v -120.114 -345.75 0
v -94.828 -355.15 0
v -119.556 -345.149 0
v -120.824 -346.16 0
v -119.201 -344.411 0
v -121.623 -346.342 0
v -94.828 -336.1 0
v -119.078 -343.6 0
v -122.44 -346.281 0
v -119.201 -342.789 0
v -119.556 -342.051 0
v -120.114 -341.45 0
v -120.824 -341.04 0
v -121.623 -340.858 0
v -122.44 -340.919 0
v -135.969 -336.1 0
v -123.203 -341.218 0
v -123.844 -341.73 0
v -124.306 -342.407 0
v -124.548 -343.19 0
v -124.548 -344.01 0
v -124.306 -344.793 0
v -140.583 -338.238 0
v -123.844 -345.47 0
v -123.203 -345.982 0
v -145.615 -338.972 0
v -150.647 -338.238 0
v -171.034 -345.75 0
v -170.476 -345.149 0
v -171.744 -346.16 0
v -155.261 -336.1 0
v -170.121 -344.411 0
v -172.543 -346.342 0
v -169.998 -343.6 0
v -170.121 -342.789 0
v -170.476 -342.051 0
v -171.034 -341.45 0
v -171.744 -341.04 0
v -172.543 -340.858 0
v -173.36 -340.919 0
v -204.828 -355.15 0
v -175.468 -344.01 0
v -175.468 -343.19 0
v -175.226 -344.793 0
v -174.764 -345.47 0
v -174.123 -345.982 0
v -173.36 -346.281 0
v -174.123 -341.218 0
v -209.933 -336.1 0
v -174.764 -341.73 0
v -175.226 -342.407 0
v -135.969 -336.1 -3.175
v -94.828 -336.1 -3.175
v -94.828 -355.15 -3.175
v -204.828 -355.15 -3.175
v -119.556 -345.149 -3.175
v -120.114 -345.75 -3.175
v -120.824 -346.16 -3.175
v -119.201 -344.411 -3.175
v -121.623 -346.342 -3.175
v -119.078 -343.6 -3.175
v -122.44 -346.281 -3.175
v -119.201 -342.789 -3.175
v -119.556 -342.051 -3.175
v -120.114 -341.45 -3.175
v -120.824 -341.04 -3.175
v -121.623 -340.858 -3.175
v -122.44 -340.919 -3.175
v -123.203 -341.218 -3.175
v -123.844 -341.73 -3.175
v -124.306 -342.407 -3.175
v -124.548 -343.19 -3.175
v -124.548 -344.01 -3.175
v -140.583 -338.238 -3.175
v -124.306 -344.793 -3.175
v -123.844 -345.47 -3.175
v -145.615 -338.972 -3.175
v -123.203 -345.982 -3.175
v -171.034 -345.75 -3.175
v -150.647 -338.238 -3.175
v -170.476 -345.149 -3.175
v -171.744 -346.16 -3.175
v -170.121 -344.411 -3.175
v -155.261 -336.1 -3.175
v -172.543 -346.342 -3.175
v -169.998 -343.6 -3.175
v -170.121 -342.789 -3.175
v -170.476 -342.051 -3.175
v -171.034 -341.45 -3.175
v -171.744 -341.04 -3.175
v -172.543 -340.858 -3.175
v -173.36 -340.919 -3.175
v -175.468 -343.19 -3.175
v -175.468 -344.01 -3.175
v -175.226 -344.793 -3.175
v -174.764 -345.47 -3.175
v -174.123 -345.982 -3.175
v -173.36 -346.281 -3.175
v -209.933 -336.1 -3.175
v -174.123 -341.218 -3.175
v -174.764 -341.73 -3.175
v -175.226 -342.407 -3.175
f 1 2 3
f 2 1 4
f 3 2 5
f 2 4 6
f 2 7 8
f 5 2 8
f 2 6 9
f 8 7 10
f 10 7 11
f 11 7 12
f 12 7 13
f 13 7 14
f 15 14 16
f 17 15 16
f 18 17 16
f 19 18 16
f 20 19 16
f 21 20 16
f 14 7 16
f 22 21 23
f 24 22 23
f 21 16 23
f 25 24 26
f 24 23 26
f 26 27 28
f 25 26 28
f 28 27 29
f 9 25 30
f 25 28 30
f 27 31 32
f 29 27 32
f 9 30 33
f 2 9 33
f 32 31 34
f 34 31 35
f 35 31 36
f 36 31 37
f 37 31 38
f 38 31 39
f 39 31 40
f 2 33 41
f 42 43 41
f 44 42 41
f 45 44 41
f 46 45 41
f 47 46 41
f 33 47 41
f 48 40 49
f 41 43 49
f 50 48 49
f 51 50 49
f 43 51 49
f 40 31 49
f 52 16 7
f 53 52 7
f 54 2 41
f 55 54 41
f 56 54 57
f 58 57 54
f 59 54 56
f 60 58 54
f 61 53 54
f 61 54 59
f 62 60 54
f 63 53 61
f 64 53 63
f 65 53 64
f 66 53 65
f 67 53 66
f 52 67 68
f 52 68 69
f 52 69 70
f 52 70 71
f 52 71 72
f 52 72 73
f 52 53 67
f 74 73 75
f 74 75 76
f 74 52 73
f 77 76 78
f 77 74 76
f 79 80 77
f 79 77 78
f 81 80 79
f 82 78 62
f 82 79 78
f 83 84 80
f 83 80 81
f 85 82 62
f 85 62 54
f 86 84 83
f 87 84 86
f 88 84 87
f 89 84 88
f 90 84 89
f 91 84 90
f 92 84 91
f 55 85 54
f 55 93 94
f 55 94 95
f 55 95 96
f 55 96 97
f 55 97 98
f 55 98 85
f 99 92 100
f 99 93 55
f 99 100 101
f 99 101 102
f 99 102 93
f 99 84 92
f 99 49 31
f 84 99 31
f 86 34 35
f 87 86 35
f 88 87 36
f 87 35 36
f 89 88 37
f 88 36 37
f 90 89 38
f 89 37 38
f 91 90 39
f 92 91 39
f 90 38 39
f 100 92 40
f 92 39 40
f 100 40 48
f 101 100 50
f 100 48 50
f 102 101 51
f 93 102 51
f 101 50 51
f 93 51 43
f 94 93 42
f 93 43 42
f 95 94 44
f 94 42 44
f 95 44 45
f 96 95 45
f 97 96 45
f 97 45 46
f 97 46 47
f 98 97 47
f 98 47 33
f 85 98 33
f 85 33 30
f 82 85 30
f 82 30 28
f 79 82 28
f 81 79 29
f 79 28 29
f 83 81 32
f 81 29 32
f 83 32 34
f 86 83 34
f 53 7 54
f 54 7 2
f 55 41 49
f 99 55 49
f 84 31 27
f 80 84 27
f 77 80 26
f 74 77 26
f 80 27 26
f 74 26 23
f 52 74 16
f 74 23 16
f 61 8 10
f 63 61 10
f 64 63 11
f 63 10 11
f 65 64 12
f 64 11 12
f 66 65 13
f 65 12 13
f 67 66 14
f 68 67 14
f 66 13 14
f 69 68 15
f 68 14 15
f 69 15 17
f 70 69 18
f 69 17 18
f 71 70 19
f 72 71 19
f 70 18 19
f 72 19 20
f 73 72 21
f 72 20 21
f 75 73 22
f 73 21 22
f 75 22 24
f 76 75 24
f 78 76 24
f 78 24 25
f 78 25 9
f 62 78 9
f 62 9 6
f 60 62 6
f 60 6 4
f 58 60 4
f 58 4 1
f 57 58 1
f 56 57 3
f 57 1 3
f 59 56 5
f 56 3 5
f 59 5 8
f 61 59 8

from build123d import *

# Parameters (mm, degrees)
SKETCH1_R           = 2.75
BOSS_EXTRUDE1_DEPTH = 3.175


with BuildPart() as part:
    # Sketch1 → Boss-Extrude1 (new body)
    with BuildSketch(Plane.XY):
        with BuildLine():
            Line((-94.828483368, -355.15), (-204.828483368, -355.15))
            Line((-204.828483368, -355.15), (-209.932915484, -336.1))
            Line((-209.932915484, -336.1), (-155.261017178, -336.1))
            ThreePointArc((-155.261017178, -336.1), (-145.615191064, -338.971618374), (-135.96936495, -336.1))
            Line((-135.96936495, -336.1), (-94.828483368, -336.1))
            Line((-94.828483368, -336.1), (-94.828483368, -355.15))
        make_face()
        with Locations((-121.828483368, -343.6)):
            Circle(SKETCH1_R, mode=Mode.SUBTRACT)
        with Locations((-172.748438952, -343.6)):
            Circle(SKETCH1_R, mode=Mode.SUBTRACT)
    extrude(amount=-BOSS_EXTRUDE1_DEPTH)


solid = part.part
